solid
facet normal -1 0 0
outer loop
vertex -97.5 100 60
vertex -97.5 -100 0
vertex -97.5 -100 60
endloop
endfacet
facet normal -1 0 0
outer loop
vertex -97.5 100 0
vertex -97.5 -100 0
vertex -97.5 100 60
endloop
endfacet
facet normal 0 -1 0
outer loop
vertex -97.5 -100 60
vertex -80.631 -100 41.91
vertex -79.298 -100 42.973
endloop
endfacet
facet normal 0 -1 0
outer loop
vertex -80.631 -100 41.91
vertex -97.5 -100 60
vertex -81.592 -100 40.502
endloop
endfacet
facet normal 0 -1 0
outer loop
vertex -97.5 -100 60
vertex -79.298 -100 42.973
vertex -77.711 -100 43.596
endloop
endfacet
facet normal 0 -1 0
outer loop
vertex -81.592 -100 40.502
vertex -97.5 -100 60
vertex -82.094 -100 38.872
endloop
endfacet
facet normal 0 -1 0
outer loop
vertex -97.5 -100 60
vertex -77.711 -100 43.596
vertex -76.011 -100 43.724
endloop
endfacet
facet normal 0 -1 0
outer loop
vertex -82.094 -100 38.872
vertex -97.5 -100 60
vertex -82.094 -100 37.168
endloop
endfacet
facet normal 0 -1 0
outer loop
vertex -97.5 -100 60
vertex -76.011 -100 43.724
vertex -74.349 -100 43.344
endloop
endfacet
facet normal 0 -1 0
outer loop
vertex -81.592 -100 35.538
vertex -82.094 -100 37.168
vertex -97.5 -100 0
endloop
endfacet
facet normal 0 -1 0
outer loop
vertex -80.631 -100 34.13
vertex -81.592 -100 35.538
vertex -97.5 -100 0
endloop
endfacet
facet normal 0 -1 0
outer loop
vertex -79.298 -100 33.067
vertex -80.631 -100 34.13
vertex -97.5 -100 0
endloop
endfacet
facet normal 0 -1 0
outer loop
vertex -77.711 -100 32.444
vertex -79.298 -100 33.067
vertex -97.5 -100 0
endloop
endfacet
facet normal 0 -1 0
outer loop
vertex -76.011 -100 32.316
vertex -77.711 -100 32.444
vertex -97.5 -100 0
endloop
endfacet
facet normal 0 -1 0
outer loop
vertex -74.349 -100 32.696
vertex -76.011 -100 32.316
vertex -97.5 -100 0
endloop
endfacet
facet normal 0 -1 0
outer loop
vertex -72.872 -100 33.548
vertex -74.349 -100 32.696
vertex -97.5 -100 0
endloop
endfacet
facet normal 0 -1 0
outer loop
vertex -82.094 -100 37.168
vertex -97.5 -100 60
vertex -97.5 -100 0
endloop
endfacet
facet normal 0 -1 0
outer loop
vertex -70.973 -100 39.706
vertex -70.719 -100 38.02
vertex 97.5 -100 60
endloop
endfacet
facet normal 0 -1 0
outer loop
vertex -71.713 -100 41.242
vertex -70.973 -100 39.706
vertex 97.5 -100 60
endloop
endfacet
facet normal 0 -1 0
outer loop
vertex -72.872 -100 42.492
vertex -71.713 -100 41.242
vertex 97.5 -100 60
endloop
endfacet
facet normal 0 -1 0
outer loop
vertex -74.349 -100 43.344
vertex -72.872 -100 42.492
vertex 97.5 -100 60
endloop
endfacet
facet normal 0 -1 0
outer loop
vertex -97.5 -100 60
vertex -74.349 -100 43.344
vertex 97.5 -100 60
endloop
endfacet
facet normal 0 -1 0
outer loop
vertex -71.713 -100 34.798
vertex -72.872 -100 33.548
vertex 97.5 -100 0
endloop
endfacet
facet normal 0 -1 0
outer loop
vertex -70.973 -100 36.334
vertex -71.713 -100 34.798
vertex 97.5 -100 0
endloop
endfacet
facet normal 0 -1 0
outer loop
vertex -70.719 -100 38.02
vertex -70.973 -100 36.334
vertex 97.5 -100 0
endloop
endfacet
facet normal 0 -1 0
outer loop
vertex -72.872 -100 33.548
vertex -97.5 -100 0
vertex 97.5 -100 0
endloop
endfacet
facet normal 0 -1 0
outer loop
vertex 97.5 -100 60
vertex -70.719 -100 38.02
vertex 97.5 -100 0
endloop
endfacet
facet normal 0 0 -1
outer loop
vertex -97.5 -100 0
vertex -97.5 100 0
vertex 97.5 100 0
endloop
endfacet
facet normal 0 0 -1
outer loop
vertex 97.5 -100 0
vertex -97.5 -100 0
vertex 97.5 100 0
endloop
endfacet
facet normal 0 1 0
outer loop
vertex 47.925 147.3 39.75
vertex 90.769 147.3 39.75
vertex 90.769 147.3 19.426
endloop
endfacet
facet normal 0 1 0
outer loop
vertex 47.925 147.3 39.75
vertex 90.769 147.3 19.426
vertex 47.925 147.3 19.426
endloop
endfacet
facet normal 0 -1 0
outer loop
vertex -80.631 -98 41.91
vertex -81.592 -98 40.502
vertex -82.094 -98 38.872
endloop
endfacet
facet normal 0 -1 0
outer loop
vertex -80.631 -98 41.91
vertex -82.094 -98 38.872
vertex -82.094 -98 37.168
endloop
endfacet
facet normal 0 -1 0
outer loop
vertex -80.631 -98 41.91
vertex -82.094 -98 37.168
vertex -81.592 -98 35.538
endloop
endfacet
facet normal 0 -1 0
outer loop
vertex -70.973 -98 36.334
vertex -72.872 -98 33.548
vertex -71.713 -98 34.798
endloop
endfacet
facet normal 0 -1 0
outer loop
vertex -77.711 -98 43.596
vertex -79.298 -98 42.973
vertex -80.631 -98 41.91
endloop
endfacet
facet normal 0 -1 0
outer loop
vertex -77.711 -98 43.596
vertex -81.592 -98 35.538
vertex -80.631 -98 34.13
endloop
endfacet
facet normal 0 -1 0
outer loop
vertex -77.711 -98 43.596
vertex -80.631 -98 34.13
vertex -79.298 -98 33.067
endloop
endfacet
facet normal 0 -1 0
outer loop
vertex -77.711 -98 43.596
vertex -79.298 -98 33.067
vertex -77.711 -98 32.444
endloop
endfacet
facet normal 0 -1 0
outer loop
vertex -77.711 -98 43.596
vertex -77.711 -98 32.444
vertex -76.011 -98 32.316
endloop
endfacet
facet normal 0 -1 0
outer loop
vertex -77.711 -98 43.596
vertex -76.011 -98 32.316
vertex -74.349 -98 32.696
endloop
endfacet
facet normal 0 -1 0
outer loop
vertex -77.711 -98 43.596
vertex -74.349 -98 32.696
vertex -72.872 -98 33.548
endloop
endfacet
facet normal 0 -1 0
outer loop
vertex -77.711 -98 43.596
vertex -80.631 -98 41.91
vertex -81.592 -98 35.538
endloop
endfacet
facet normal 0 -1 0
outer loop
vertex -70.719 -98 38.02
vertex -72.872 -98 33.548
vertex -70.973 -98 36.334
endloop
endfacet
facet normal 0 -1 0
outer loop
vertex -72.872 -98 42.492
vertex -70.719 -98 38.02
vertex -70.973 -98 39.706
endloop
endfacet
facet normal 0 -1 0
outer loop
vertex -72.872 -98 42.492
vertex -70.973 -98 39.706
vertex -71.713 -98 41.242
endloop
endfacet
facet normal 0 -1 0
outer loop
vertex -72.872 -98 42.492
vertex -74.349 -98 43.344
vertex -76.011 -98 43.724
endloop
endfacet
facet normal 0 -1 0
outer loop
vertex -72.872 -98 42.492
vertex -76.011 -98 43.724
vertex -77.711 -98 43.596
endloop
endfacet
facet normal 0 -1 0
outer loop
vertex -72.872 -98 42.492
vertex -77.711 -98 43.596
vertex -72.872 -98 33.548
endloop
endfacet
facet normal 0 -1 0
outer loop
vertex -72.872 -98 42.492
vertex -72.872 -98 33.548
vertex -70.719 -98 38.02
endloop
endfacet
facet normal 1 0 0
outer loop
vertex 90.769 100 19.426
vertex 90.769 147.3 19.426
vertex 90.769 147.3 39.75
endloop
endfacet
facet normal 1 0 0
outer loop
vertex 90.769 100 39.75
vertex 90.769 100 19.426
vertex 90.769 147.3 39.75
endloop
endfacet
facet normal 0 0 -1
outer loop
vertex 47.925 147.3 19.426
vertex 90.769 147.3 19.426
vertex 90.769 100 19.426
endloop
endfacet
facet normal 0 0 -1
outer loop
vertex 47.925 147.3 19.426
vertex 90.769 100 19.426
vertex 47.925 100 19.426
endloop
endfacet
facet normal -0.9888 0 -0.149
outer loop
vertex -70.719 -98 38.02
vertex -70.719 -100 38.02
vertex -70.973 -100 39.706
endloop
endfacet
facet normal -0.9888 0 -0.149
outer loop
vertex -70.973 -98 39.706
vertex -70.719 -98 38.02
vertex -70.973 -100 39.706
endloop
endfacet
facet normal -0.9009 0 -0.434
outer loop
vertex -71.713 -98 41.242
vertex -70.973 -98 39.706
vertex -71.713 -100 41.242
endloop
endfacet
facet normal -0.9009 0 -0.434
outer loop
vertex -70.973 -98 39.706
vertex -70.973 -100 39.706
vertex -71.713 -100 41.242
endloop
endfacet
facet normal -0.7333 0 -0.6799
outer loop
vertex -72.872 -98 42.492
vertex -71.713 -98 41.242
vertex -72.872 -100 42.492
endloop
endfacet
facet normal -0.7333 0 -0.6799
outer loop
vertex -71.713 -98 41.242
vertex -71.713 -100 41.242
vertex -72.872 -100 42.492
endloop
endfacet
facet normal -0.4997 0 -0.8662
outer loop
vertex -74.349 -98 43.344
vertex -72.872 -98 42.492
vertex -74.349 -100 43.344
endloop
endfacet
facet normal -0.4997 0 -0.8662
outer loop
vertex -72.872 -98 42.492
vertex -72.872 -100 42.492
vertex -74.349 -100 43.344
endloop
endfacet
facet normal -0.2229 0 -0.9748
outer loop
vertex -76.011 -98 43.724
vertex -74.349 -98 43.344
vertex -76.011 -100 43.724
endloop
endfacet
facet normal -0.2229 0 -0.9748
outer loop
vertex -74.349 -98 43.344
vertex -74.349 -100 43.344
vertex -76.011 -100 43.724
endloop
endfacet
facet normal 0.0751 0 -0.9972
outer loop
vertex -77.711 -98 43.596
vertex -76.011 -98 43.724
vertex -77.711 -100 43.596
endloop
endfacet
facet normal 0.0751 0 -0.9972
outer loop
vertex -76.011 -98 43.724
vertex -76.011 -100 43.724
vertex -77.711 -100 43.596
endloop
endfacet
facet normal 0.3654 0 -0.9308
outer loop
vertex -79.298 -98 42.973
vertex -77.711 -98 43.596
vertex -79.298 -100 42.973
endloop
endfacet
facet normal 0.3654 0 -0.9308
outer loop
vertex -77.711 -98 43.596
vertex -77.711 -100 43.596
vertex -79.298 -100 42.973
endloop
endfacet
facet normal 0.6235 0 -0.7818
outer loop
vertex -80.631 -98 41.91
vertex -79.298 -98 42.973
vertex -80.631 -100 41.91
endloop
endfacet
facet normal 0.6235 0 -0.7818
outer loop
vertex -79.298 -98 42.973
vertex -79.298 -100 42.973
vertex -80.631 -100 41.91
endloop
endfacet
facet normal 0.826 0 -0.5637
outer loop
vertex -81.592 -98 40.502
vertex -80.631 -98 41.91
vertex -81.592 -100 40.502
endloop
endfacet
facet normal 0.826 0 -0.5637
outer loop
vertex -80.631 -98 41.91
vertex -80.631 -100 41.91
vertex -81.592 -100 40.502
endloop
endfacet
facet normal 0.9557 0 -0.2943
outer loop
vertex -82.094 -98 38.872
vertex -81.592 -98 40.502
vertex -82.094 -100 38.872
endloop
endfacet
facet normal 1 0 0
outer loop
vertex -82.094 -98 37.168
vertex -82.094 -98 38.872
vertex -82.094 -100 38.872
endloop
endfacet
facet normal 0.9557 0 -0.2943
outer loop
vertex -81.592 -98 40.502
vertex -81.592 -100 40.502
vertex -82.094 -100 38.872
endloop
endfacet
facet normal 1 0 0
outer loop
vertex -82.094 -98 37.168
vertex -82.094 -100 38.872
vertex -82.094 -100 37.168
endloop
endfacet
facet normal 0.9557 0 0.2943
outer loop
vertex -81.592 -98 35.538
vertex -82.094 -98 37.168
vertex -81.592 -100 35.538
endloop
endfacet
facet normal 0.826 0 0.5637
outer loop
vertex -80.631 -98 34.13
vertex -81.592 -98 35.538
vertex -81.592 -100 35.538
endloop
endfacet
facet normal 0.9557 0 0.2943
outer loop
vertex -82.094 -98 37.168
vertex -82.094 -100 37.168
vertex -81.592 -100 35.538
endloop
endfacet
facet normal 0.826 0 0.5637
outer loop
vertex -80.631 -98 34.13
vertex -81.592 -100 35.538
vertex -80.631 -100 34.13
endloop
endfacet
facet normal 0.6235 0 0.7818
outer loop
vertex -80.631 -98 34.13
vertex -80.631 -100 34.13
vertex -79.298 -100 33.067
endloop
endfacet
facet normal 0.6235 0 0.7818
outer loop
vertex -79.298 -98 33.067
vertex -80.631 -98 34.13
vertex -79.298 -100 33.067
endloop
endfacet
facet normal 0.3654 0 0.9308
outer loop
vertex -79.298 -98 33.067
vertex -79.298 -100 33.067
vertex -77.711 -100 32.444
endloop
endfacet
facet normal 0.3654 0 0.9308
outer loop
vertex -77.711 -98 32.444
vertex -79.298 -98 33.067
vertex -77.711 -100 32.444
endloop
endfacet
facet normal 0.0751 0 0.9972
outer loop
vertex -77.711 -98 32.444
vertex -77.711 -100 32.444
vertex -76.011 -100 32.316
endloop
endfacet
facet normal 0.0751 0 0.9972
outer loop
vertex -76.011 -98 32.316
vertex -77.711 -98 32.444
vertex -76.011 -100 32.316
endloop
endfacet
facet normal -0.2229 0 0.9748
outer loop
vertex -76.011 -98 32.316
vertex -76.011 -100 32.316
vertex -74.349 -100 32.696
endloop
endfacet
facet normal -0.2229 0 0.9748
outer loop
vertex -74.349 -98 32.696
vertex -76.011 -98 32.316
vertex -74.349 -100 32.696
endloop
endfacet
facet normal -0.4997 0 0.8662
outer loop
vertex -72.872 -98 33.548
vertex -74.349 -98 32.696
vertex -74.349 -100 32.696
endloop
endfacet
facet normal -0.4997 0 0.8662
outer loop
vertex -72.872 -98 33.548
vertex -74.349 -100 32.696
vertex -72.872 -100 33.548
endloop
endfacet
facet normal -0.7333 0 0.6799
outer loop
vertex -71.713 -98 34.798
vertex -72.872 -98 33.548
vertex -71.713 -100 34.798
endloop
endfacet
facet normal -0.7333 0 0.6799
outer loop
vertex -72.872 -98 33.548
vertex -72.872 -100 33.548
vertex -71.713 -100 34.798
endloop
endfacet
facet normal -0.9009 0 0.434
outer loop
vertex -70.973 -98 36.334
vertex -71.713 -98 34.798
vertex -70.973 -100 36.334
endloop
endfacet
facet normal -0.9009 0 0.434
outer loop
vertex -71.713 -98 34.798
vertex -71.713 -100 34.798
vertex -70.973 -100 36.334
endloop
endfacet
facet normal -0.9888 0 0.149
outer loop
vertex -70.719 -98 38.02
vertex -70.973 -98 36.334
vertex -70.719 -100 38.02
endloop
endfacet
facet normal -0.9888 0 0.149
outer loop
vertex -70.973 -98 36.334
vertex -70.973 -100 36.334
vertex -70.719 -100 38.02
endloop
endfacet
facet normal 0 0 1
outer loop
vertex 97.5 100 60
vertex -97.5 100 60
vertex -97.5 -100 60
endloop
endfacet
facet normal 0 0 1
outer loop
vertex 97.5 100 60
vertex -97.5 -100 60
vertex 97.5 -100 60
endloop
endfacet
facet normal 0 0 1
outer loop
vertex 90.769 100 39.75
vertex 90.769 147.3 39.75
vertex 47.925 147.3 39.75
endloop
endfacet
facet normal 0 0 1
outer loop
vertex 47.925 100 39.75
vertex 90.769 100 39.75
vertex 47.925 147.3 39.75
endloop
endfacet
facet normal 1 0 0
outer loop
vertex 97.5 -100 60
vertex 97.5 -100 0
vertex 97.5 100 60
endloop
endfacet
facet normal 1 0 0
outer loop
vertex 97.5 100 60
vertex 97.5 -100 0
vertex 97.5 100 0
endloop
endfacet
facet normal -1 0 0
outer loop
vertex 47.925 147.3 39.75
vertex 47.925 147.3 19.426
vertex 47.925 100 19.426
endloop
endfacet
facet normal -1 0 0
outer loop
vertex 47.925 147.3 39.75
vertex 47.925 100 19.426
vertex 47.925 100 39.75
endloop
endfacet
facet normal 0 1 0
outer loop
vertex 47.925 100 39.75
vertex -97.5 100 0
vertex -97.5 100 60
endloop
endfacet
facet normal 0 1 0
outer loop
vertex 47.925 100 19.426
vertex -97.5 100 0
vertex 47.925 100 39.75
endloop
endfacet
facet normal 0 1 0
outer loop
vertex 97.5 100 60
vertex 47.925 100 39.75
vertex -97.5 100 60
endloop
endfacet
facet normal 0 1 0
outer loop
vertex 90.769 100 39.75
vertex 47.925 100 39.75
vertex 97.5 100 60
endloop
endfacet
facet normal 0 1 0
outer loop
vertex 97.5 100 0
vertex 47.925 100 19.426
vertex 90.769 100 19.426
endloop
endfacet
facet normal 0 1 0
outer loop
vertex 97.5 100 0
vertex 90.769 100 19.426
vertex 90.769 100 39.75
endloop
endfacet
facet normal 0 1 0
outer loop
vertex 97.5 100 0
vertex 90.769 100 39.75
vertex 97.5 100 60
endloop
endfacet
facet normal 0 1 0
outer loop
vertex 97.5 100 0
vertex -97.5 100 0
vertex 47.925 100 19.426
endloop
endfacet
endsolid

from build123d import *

# Parameters (mm, degrees)
F0_W     = 195
F0_H     = 200
F1_DEPTH = 60
F2_W     = 42.843923
F2_H     = 20.3234
F3_DEPTH = 47.3
F4_R     = 5.719599
F5_DEPTH = 2


with BuildPart() as f1:
    # F0 (on Top) → F1 (new body)
    with BuildSketch(Plane.XY):
        Rectangle(F0_W, F0_H)
    extrude(amount=F1_DEPTH)

    # F2 (on face) → F3 (join)
    with BuildSketch(Plane(origin=(0, 100, 0), x_dir=(-1, 0, 0), z_dir=(0, 1, 0))):
        with Locations((-69.346733, 29.588042)):
            Rectangle(F2_W, F2_H)
    extrude(amount=F3_DEPTH)

    # F4 (on face) → F5 (cut)
    with BuildSketch(Plane.XZ.offset(100)):
        with Locations((-76.43842, 38.019974)):
            Circle(F4_R)
    extrude(amount=-F5_DEPTH, mode=Mode.SUBTRACT)


solid = f1.part
